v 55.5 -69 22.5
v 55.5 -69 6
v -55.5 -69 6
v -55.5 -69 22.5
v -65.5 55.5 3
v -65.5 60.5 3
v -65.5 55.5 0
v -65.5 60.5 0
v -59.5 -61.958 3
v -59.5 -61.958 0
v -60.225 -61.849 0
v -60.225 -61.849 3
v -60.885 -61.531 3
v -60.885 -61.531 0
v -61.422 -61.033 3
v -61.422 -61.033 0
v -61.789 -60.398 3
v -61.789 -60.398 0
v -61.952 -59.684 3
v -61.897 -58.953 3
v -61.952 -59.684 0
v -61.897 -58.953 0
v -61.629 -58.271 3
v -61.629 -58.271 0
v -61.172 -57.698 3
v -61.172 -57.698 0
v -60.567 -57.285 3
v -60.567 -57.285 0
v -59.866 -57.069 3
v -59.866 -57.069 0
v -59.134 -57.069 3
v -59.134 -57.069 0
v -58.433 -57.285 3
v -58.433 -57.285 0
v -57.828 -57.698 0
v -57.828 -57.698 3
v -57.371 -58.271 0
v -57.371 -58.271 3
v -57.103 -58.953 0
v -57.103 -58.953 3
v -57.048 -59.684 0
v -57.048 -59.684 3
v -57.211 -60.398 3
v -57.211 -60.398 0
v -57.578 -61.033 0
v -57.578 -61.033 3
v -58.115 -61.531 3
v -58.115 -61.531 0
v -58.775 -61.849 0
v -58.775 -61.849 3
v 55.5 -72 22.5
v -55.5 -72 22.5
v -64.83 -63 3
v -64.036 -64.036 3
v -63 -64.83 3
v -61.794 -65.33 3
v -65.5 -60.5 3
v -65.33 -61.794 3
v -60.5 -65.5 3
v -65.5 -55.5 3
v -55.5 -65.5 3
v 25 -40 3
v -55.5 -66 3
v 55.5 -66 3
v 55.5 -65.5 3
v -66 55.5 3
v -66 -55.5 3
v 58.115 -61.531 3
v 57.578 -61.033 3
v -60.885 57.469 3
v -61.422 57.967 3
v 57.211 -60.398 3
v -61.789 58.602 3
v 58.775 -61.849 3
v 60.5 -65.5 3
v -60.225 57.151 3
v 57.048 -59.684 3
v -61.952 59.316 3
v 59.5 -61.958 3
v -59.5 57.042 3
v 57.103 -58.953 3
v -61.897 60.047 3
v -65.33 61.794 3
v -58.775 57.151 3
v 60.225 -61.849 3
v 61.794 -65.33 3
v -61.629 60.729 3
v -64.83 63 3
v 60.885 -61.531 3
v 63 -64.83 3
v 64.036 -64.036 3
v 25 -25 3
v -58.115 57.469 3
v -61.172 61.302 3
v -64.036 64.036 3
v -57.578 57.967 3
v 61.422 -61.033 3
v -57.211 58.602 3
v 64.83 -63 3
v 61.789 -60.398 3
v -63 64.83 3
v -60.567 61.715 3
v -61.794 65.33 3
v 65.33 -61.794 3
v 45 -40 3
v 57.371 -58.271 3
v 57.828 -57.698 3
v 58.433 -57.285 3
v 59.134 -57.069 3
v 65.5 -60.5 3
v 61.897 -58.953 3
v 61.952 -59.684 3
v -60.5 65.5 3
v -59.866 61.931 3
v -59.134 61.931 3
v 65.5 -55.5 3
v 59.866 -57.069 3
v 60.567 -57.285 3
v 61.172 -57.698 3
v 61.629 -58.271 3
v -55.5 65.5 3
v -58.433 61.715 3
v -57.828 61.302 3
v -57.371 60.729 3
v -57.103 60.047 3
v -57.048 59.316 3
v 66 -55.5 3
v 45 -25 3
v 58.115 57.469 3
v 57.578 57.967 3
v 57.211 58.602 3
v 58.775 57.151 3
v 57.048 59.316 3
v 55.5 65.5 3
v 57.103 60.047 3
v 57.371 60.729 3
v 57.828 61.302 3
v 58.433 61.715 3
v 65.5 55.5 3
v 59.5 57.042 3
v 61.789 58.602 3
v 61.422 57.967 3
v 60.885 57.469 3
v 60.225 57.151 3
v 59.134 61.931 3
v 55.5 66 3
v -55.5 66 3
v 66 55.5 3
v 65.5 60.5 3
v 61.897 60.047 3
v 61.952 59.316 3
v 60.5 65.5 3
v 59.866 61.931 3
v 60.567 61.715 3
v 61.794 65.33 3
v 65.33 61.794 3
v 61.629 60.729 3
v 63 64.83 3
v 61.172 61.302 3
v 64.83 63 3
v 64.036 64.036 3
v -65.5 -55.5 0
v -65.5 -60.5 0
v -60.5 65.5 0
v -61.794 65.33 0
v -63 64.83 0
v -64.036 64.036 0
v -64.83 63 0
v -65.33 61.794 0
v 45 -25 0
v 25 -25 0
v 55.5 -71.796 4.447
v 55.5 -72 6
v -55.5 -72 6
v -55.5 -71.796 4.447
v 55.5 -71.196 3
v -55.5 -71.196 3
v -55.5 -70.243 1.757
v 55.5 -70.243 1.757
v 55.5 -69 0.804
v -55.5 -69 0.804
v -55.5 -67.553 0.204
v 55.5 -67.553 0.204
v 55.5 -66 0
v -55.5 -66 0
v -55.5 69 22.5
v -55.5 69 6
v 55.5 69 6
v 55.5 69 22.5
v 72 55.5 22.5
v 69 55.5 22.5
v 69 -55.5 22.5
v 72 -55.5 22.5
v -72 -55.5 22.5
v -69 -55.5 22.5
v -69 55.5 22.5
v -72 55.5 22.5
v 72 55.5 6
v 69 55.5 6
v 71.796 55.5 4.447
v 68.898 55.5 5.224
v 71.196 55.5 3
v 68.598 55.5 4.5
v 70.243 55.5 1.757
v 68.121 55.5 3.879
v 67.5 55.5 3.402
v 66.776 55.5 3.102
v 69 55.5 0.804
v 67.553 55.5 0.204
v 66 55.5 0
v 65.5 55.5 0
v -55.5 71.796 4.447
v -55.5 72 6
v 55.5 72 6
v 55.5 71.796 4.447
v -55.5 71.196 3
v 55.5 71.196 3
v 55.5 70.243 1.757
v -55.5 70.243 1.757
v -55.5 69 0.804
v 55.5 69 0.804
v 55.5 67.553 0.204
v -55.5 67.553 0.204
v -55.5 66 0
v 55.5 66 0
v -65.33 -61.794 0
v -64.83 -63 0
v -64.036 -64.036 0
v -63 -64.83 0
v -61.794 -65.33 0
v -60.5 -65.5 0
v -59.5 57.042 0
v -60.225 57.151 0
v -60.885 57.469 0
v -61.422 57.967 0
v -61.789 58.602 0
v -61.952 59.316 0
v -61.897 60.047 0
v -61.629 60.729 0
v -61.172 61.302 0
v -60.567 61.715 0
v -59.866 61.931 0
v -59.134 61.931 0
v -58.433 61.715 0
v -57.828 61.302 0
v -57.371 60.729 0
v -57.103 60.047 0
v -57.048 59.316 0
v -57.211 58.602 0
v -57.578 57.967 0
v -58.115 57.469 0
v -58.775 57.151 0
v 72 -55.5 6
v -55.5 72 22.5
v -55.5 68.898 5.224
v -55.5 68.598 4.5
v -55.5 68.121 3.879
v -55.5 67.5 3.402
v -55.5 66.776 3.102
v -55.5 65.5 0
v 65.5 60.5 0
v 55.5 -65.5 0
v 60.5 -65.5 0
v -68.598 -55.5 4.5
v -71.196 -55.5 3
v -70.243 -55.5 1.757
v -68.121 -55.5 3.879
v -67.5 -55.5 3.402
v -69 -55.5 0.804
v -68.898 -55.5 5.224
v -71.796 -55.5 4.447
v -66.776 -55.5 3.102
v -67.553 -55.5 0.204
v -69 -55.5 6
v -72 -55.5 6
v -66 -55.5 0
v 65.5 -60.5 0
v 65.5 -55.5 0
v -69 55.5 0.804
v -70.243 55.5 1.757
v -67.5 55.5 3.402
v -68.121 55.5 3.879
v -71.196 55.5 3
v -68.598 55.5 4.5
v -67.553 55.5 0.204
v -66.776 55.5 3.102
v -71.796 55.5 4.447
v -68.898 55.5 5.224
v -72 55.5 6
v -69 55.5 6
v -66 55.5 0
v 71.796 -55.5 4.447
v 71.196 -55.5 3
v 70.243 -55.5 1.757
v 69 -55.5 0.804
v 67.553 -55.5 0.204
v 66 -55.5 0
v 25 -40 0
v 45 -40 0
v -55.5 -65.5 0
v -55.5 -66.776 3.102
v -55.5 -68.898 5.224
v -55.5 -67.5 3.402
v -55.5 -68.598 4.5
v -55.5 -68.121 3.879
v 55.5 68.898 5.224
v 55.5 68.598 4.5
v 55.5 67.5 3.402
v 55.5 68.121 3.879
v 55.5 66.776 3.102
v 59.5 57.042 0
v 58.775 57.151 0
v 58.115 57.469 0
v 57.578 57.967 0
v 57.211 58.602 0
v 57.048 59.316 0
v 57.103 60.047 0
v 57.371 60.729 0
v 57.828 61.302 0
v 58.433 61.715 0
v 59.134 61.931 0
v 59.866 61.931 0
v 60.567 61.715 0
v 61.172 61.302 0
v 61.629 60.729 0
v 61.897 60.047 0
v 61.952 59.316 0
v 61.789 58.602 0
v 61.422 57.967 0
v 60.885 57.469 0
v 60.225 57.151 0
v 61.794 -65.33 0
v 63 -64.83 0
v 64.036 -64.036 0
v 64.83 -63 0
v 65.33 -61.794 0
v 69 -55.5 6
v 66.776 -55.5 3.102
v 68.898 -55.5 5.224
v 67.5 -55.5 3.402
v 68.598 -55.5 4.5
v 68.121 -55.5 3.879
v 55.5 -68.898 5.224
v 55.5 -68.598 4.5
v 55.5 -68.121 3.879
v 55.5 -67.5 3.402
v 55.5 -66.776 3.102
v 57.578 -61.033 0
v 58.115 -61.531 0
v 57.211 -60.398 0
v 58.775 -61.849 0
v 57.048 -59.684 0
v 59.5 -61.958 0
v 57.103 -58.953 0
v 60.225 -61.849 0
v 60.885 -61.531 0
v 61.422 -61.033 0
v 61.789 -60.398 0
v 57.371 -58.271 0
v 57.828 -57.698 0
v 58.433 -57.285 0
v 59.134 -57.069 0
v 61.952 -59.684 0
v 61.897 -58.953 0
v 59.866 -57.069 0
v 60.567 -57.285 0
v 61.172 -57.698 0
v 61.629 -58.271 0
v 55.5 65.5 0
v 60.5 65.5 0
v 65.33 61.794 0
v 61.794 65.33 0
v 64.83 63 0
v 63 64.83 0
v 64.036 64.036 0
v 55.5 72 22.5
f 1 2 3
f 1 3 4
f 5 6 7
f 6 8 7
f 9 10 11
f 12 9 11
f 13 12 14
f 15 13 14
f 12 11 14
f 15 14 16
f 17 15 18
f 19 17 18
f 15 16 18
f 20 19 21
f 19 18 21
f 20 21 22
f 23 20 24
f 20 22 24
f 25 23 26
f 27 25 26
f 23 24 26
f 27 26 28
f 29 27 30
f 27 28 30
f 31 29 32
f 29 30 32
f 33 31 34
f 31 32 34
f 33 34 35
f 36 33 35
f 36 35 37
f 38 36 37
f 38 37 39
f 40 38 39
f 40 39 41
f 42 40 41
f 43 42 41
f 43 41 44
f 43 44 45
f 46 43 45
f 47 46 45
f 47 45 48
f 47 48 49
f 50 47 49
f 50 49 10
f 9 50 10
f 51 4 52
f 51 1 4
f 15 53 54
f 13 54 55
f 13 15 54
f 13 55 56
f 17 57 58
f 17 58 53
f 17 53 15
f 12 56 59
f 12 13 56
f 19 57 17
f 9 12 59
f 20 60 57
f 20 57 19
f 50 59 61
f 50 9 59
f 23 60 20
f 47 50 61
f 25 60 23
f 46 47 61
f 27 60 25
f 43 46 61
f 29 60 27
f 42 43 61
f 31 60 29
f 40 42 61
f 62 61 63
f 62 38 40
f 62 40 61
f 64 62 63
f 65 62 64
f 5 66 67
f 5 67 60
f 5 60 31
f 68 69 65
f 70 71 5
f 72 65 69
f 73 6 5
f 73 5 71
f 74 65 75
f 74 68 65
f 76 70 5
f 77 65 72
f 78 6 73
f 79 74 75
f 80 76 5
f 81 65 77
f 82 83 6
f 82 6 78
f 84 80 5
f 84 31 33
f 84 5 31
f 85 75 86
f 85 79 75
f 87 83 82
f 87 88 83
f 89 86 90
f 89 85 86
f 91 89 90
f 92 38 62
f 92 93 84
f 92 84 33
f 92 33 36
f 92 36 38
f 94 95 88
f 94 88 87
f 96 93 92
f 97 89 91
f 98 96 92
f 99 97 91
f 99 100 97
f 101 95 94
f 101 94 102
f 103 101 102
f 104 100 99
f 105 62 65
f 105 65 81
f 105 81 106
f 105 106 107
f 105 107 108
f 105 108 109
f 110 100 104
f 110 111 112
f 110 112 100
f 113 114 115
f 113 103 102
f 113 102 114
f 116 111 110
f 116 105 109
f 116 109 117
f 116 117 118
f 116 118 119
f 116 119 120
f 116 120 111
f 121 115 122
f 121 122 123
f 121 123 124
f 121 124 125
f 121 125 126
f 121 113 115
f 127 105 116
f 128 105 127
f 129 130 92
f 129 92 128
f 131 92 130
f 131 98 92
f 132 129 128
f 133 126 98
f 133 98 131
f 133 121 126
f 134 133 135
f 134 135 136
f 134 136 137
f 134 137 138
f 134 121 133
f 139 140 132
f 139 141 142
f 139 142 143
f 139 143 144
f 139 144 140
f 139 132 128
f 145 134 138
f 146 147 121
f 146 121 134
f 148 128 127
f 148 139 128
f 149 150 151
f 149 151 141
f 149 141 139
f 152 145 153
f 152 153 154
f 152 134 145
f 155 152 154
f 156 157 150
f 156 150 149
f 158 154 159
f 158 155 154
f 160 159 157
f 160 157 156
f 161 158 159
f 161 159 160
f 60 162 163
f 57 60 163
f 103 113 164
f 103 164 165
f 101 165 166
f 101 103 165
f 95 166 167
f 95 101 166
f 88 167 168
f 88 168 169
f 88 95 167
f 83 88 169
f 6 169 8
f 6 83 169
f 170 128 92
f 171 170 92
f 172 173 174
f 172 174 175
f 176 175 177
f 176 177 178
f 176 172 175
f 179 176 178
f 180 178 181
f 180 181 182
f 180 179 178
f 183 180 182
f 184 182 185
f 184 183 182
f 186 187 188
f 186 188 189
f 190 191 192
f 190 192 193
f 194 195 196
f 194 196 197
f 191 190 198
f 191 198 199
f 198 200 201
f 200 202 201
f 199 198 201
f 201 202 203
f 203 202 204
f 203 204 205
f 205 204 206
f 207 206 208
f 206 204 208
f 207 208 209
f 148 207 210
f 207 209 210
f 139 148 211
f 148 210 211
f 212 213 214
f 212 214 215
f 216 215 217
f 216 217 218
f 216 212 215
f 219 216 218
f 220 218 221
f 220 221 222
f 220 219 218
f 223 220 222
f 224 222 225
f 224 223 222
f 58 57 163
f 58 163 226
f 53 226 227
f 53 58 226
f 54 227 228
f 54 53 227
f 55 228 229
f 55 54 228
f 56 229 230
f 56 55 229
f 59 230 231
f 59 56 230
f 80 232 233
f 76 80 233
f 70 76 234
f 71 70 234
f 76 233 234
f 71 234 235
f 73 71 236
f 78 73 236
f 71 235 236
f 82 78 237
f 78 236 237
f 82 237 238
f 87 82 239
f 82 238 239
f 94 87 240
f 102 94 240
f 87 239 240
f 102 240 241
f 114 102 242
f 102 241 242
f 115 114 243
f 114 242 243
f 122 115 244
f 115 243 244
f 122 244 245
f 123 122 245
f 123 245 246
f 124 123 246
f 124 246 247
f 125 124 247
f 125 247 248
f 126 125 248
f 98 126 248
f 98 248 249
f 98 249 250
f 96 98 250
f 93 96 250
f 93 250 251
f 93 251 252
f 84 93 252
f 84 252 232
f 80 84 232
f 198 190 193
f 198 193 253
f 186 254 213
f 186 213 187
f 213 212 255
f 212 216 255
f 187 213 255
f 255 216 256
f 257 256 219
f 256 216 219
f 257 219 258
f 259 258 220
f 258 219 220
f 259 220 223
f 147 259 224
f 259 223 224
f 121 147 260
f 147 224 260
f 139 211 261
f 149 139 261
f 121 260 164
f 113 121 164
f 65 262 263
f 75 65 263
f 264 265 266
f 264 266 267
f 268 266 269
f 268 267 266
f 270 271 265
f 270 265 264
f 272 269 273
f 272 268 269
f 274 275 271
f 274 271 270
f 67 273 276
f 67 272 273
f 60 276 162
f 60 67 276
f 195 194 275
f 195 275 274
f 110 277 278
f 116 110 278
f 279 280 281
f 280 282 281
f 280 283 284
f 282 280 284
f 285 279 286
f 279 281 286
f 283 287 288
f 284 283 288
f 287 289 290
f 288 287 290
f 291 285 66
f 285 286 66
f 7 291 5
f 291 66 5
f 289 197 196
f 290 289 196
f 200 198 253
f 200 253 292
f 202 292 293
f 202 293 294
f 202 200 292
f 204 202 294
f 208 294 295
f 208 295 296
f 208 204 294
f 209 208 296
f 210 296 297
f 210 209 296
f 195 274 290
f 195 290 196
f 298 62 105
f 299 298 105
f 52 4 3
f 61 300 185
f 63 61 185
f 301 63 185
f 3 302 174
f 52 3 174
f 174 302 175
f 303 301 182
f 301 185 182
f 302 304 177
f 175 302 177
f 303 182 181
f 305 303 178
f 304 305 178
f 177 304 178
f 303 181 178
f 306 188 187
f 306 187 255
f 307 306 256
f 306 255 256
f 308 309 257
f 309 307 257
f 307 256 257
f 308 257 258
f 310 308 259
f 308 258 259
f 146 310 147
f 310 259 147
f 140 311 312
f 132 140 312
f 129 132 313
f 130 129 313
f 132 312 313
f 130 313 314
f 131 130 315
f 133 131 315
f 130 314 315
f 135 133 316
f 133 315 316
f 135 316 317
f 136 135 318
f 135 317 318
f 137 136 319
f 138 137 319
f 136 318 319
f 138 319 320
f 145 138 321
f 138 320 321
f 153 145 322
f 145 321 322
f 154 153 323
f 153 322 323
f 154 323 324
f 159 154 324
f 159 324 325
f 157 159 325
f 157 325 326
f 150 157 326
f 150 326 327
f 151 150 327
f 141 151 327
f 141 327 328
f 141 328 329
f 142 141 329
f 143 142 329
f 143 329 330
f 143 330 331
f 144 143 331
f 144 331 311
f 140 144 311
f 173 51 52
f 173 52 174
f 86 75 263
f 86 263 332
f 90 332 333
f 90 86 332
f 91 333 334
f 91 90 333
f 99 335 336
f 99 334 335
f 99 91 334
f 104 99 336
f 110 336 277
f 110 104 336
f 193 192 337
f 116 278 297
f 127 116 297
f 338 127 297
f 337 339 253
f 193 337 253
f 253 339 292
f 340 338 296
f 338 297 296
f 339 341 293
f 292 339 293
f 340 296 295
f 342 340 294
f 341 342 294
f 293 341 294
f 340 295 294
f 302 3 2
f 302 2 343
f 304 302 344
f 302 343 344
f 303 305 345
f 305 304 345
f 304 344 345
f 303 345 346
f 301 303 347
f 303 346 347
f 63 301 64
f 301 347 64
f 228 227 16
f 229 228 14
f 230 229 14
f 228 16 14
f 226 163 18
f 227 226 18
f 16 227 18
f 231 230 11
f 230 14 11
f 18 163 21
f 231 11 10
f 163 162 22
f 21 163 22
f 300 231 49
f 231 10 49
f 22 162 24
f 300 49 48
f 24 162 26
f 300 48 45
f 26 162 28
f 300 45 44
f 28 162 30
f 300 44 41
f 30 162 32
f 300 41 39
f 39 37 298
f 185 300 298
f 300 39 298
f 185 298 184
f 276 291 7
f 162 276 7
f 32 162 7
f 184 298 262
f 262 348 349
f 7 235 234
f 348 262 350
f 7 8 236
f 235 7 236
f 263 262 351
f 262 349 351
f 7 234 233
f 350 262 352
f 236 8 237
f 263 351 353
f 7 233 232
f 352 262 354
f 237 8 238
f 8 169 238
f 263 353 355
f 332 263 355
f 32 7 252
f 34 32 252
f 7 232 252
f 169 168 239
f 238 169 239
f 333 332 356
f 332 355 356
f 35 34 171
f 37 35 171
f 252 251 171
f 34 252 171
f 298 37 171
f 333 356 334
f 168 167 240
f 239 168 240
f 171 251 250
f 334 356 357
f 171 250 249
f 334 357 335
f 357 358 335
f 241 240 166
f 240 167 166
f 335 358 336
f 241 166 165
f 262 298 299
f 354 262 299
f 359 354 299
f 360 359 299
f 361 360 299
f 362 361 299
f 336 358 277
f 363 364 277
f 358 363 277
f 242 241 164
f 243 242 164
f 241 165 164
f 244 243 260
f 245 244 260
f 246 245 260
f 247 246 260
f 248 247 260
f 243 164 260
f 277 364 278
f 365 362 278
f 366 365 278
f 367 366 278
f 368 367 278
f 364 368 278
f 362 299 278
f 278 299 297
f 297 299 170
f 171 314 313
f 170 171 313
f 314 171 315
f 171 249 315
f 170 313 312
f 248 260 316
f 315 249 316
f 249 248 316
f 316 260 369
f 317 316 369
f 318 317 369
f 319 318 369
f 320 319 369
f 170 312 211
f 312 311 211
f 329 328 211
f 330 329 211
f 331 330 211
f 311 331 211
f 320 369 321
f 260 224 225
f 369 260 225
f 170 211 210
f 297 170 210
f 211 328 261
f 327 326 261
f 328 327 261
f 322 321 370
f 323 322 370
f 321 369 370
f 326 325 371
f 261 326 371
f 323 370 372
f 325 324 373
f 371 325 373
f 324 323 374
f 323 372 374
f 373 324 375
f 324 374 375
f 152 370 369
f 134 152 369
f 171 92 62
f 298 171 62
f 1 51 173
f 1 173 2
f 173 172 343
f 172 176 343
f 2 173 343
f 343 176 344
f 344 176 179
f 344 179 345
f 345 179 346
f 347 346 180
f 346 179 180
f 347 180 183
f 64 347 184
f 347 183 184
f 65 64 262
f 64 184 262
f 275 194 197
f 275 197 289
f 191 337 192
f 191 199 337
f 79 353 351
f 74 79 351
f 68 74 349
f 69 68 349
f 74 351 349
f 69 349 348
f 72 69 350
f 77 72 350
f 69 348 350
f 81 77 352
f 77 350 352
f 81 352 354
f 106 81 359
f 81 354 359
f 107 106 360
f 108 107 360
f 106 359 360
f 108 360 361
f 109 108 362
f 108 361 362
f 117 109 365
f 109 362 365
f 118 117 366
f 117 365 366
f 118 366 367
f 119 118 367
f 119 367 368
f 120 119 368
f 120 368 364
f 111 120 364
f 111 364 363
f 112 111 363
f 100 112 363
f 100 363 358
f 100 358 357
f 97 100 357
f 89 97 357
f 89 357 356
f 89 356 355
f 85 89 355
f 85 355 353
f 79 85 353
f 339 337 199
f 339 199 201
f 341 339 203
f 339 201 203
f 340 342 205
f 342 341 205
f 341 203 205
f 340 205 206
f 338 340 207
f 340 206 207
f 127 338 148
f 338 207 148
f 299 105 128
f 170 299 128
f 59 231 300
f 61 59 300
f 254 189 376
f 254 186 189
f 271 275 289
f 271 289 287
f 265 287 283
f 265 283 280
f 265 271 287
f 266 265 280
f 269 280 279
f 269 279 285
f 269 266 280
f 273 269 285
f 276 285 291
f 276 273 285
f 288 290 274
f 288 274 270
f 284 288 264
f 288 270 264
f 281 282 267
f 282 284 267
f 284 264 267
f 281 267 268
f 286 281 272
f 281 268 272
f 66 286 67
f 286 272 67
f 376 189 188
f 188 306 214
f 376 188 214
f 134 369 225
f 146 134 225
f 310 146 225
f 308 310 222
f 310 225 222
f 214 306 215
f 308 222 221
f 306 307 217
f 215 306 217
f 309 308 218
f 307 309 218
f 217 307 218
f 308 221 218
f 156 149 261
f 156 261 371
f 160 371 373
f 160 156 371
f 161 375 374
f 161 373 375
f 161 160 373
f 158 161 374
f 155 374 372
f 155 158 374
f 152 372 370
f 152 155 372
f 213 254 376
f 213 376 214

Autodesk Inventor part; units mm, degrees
ref_plane "YZ Plane" through (0, 0, 0) normal (1, 0, 0) x (0, 1, 0)
ref_plane "XZ Plane" through (0, 0, 0) normal (0, 1, 0) x (-1, 0, 0)
ref_plane "XY Plane" through (0, 0, 0) normal (0, 0, 1) x (1, 0, 0)
sketch "Sketch1" plane through (0, 0, 0) normal (0, 0, 1) x (1, 0, 0)
  line L0 (55.5, 72) -> (-55.5, 72)
  line L1 (-55.5, 72) -> (-55.5, 65.5)
  line L2 (-55.5, 65.5) -> (-65.5, 65.5)
  line L3 (-65.5, 65.5) -> (-65.5, 55.5)
  line L4 (-65.5, 55.5) -> (-72, 55.5)
  line L5 (-72, 55.5) -> (-72, -55.5)
  line L6 (-72, -55.5) -> (-65.5, -55.5)
  line L7 (-65.5, -55.5) -> (-65.5, -65.5)
  line L8 (-65.5, -65.5) -> (-55.5, -65.5)
  line L9 (-55.5, -65.5) -> (-55.5, -72)
  line L10 (-55.5, -72) -> (55.5, -72)
  line L11 (55.5, -72) -> (55.5, -65.5)
  line L12 (55.5, -65.5) -> (65.5, -65.5)
  line L13 (65.5, -65.5) -> (65.5, -55.5)
  line L14 (65.5, -55.5) -> (72, -55.5)
  line L15 (72, -55.5) -> (72, 55.5)
  line L16 (72, 55.5) -> (65.5, 55.5)
  line L17 (65.5, 55.5) -> (65.5, 65.5)
  line L18 (65.5, 65.5) -> (55.5, 65.5)
  line L19 (55.5, 65.5) -> (55.5, 72)
  point P0 (0, 0)
  dimension "d5" = 144
  dimension "d14" = 144
  dimension "d15" = 72
  dimension "d16" = 72
  dimension "d28" = 10
  dimension "d30" = 10
  dimension "d31" = 10
  dimension "d32" = 111
  dimension "d33" = 111
extrude "Plate1" add sketch "Sketch1" along normal blind 3
sketch "Sketch2" plane through (-69, -55.5, 0) normal (-1, 0, 0) x (0, -1, 0)
  line L0 (-111, 0) -> (0, 0)
  line L1 (0, 0) -> (0, 22.5)
  line L2 (0, 22.5) -> (-111, 22.5)
  line L3 (-111, 22.5) -> (-111, 0)
edge flange "Flange1" height 22.5 angle 90 thickness 3 bend radius 3 thickness toward (-1, 0, 0) relief tear relief width 3 relief depth 0 corner gap 3 corner form 0 edges at (-72, 0, 3) (0, -72, 3) (72, 0, 3) (0, 72, 3) wall of the first edge with corners at (-69, 55.5, 0) (-69, -55.5, 0) (-69, -55.5, 22.5) (-69, 55.5, 22.5)
bend "Bend1"
corner "Corner1"
sketch "Sketch3" plane through (0, 0, 3) normal (0, 0, 1) x (1, 0, 0)
  line L0 (59.5, -59.5) -> (-59.5, -59.5)
  line L1 (-59.5, -59.5) -> (-59.5, 59.5)
  line L2 (-59.5, 59.5) -> (59.5, 59.5)
  line L3 (59.5, 59.5) -> (59.5, -59.5)
  circle A0 centre (59.5, -59.5) radius 3
  point P0 (0, 0)
  dimension "d34" = 119
  dimension "d35" = 119
  dimension "d36" = 59.5
  dimension "d37" = 59.5
  dimension "d38" = 6
hole "Hole1" at (59.5, -59.5, 3) at (-59.5, -59.5, 3) at (-59.5, 59.5, 3) at (59.5, 59.5, 3) direction (0, 0, -1) diameter 4.917 end through all thread size "M6x1" class "6H" standard "ISO Metric profile"
fillet "Corner Round1" radius 5 4 edges at (65.5, -65.5, 1.5) (65.5, 65.5, 1.5) (-65.5, 65.5, 1.5) (-65.5, -65.5, 1.5)
sketch "Sketch4" plane through (0, 0, 3) normal (0, 0, 1) x (1, 0, 0)
  line L0 (45, -25) -> (25, -25)
  line L1 (25, -25) -> (25, -40)
  line L2 (25, -40) -> (45, -40)
  line L3 (45, -40) -> (45, -25)
  point P0 (0, 0)
  dimension "d47" = 20
  dimension "d48" = 15
  dimension "d49" = 25
  dimension "d50" = 25
extrude "Cut1" cut sketch "Sketch4" against normal blind 3
equation "\"d36\" = 0.5 * d34"
equation "\"d37\" = 0.5 * d35"
equation "\"d40\" = Thickness"
equation "\"d44\" = Thickness"
equation "\"d51\" = Thickness"
equation "\"d17\" = Thickness"
equation "\"d18\" = BendReliefWidth"
equation "\"d20\" = MinimumRemnant"
equation "\"d21\" = TransitionRadius"
equation "\"d24\" = BendRadius"
equation "\"d25\" = CornerReliefSize"
equation "\"d26\" = GapSize"
equation "\"d27\" = JacobiRadiusSize"
equation "\"d15\" = 0.5 * d5"
equation "\"d16\" = 0.5 * d14"
equation "\"BendRadius\" = Thickness"
equation "\"BendReliefWidth\" = Thickness"
equation "\"BendReliefDepth\" = 0.5 * Thickness"
equation "\"CornerReliefSize\" = 4 * Thickness"
equation "\"MinimumRemnant\" = 2 * Thickness"
equation "\"TransitionRadius\" = BendRadius"
equation "\"JacobiRadiusSize\" = BendRadius"
equation "\"GapSize\" = Thickness"
equation "\"Thickness\" = 3"
properties part number "WaageBlechUnterseite"
